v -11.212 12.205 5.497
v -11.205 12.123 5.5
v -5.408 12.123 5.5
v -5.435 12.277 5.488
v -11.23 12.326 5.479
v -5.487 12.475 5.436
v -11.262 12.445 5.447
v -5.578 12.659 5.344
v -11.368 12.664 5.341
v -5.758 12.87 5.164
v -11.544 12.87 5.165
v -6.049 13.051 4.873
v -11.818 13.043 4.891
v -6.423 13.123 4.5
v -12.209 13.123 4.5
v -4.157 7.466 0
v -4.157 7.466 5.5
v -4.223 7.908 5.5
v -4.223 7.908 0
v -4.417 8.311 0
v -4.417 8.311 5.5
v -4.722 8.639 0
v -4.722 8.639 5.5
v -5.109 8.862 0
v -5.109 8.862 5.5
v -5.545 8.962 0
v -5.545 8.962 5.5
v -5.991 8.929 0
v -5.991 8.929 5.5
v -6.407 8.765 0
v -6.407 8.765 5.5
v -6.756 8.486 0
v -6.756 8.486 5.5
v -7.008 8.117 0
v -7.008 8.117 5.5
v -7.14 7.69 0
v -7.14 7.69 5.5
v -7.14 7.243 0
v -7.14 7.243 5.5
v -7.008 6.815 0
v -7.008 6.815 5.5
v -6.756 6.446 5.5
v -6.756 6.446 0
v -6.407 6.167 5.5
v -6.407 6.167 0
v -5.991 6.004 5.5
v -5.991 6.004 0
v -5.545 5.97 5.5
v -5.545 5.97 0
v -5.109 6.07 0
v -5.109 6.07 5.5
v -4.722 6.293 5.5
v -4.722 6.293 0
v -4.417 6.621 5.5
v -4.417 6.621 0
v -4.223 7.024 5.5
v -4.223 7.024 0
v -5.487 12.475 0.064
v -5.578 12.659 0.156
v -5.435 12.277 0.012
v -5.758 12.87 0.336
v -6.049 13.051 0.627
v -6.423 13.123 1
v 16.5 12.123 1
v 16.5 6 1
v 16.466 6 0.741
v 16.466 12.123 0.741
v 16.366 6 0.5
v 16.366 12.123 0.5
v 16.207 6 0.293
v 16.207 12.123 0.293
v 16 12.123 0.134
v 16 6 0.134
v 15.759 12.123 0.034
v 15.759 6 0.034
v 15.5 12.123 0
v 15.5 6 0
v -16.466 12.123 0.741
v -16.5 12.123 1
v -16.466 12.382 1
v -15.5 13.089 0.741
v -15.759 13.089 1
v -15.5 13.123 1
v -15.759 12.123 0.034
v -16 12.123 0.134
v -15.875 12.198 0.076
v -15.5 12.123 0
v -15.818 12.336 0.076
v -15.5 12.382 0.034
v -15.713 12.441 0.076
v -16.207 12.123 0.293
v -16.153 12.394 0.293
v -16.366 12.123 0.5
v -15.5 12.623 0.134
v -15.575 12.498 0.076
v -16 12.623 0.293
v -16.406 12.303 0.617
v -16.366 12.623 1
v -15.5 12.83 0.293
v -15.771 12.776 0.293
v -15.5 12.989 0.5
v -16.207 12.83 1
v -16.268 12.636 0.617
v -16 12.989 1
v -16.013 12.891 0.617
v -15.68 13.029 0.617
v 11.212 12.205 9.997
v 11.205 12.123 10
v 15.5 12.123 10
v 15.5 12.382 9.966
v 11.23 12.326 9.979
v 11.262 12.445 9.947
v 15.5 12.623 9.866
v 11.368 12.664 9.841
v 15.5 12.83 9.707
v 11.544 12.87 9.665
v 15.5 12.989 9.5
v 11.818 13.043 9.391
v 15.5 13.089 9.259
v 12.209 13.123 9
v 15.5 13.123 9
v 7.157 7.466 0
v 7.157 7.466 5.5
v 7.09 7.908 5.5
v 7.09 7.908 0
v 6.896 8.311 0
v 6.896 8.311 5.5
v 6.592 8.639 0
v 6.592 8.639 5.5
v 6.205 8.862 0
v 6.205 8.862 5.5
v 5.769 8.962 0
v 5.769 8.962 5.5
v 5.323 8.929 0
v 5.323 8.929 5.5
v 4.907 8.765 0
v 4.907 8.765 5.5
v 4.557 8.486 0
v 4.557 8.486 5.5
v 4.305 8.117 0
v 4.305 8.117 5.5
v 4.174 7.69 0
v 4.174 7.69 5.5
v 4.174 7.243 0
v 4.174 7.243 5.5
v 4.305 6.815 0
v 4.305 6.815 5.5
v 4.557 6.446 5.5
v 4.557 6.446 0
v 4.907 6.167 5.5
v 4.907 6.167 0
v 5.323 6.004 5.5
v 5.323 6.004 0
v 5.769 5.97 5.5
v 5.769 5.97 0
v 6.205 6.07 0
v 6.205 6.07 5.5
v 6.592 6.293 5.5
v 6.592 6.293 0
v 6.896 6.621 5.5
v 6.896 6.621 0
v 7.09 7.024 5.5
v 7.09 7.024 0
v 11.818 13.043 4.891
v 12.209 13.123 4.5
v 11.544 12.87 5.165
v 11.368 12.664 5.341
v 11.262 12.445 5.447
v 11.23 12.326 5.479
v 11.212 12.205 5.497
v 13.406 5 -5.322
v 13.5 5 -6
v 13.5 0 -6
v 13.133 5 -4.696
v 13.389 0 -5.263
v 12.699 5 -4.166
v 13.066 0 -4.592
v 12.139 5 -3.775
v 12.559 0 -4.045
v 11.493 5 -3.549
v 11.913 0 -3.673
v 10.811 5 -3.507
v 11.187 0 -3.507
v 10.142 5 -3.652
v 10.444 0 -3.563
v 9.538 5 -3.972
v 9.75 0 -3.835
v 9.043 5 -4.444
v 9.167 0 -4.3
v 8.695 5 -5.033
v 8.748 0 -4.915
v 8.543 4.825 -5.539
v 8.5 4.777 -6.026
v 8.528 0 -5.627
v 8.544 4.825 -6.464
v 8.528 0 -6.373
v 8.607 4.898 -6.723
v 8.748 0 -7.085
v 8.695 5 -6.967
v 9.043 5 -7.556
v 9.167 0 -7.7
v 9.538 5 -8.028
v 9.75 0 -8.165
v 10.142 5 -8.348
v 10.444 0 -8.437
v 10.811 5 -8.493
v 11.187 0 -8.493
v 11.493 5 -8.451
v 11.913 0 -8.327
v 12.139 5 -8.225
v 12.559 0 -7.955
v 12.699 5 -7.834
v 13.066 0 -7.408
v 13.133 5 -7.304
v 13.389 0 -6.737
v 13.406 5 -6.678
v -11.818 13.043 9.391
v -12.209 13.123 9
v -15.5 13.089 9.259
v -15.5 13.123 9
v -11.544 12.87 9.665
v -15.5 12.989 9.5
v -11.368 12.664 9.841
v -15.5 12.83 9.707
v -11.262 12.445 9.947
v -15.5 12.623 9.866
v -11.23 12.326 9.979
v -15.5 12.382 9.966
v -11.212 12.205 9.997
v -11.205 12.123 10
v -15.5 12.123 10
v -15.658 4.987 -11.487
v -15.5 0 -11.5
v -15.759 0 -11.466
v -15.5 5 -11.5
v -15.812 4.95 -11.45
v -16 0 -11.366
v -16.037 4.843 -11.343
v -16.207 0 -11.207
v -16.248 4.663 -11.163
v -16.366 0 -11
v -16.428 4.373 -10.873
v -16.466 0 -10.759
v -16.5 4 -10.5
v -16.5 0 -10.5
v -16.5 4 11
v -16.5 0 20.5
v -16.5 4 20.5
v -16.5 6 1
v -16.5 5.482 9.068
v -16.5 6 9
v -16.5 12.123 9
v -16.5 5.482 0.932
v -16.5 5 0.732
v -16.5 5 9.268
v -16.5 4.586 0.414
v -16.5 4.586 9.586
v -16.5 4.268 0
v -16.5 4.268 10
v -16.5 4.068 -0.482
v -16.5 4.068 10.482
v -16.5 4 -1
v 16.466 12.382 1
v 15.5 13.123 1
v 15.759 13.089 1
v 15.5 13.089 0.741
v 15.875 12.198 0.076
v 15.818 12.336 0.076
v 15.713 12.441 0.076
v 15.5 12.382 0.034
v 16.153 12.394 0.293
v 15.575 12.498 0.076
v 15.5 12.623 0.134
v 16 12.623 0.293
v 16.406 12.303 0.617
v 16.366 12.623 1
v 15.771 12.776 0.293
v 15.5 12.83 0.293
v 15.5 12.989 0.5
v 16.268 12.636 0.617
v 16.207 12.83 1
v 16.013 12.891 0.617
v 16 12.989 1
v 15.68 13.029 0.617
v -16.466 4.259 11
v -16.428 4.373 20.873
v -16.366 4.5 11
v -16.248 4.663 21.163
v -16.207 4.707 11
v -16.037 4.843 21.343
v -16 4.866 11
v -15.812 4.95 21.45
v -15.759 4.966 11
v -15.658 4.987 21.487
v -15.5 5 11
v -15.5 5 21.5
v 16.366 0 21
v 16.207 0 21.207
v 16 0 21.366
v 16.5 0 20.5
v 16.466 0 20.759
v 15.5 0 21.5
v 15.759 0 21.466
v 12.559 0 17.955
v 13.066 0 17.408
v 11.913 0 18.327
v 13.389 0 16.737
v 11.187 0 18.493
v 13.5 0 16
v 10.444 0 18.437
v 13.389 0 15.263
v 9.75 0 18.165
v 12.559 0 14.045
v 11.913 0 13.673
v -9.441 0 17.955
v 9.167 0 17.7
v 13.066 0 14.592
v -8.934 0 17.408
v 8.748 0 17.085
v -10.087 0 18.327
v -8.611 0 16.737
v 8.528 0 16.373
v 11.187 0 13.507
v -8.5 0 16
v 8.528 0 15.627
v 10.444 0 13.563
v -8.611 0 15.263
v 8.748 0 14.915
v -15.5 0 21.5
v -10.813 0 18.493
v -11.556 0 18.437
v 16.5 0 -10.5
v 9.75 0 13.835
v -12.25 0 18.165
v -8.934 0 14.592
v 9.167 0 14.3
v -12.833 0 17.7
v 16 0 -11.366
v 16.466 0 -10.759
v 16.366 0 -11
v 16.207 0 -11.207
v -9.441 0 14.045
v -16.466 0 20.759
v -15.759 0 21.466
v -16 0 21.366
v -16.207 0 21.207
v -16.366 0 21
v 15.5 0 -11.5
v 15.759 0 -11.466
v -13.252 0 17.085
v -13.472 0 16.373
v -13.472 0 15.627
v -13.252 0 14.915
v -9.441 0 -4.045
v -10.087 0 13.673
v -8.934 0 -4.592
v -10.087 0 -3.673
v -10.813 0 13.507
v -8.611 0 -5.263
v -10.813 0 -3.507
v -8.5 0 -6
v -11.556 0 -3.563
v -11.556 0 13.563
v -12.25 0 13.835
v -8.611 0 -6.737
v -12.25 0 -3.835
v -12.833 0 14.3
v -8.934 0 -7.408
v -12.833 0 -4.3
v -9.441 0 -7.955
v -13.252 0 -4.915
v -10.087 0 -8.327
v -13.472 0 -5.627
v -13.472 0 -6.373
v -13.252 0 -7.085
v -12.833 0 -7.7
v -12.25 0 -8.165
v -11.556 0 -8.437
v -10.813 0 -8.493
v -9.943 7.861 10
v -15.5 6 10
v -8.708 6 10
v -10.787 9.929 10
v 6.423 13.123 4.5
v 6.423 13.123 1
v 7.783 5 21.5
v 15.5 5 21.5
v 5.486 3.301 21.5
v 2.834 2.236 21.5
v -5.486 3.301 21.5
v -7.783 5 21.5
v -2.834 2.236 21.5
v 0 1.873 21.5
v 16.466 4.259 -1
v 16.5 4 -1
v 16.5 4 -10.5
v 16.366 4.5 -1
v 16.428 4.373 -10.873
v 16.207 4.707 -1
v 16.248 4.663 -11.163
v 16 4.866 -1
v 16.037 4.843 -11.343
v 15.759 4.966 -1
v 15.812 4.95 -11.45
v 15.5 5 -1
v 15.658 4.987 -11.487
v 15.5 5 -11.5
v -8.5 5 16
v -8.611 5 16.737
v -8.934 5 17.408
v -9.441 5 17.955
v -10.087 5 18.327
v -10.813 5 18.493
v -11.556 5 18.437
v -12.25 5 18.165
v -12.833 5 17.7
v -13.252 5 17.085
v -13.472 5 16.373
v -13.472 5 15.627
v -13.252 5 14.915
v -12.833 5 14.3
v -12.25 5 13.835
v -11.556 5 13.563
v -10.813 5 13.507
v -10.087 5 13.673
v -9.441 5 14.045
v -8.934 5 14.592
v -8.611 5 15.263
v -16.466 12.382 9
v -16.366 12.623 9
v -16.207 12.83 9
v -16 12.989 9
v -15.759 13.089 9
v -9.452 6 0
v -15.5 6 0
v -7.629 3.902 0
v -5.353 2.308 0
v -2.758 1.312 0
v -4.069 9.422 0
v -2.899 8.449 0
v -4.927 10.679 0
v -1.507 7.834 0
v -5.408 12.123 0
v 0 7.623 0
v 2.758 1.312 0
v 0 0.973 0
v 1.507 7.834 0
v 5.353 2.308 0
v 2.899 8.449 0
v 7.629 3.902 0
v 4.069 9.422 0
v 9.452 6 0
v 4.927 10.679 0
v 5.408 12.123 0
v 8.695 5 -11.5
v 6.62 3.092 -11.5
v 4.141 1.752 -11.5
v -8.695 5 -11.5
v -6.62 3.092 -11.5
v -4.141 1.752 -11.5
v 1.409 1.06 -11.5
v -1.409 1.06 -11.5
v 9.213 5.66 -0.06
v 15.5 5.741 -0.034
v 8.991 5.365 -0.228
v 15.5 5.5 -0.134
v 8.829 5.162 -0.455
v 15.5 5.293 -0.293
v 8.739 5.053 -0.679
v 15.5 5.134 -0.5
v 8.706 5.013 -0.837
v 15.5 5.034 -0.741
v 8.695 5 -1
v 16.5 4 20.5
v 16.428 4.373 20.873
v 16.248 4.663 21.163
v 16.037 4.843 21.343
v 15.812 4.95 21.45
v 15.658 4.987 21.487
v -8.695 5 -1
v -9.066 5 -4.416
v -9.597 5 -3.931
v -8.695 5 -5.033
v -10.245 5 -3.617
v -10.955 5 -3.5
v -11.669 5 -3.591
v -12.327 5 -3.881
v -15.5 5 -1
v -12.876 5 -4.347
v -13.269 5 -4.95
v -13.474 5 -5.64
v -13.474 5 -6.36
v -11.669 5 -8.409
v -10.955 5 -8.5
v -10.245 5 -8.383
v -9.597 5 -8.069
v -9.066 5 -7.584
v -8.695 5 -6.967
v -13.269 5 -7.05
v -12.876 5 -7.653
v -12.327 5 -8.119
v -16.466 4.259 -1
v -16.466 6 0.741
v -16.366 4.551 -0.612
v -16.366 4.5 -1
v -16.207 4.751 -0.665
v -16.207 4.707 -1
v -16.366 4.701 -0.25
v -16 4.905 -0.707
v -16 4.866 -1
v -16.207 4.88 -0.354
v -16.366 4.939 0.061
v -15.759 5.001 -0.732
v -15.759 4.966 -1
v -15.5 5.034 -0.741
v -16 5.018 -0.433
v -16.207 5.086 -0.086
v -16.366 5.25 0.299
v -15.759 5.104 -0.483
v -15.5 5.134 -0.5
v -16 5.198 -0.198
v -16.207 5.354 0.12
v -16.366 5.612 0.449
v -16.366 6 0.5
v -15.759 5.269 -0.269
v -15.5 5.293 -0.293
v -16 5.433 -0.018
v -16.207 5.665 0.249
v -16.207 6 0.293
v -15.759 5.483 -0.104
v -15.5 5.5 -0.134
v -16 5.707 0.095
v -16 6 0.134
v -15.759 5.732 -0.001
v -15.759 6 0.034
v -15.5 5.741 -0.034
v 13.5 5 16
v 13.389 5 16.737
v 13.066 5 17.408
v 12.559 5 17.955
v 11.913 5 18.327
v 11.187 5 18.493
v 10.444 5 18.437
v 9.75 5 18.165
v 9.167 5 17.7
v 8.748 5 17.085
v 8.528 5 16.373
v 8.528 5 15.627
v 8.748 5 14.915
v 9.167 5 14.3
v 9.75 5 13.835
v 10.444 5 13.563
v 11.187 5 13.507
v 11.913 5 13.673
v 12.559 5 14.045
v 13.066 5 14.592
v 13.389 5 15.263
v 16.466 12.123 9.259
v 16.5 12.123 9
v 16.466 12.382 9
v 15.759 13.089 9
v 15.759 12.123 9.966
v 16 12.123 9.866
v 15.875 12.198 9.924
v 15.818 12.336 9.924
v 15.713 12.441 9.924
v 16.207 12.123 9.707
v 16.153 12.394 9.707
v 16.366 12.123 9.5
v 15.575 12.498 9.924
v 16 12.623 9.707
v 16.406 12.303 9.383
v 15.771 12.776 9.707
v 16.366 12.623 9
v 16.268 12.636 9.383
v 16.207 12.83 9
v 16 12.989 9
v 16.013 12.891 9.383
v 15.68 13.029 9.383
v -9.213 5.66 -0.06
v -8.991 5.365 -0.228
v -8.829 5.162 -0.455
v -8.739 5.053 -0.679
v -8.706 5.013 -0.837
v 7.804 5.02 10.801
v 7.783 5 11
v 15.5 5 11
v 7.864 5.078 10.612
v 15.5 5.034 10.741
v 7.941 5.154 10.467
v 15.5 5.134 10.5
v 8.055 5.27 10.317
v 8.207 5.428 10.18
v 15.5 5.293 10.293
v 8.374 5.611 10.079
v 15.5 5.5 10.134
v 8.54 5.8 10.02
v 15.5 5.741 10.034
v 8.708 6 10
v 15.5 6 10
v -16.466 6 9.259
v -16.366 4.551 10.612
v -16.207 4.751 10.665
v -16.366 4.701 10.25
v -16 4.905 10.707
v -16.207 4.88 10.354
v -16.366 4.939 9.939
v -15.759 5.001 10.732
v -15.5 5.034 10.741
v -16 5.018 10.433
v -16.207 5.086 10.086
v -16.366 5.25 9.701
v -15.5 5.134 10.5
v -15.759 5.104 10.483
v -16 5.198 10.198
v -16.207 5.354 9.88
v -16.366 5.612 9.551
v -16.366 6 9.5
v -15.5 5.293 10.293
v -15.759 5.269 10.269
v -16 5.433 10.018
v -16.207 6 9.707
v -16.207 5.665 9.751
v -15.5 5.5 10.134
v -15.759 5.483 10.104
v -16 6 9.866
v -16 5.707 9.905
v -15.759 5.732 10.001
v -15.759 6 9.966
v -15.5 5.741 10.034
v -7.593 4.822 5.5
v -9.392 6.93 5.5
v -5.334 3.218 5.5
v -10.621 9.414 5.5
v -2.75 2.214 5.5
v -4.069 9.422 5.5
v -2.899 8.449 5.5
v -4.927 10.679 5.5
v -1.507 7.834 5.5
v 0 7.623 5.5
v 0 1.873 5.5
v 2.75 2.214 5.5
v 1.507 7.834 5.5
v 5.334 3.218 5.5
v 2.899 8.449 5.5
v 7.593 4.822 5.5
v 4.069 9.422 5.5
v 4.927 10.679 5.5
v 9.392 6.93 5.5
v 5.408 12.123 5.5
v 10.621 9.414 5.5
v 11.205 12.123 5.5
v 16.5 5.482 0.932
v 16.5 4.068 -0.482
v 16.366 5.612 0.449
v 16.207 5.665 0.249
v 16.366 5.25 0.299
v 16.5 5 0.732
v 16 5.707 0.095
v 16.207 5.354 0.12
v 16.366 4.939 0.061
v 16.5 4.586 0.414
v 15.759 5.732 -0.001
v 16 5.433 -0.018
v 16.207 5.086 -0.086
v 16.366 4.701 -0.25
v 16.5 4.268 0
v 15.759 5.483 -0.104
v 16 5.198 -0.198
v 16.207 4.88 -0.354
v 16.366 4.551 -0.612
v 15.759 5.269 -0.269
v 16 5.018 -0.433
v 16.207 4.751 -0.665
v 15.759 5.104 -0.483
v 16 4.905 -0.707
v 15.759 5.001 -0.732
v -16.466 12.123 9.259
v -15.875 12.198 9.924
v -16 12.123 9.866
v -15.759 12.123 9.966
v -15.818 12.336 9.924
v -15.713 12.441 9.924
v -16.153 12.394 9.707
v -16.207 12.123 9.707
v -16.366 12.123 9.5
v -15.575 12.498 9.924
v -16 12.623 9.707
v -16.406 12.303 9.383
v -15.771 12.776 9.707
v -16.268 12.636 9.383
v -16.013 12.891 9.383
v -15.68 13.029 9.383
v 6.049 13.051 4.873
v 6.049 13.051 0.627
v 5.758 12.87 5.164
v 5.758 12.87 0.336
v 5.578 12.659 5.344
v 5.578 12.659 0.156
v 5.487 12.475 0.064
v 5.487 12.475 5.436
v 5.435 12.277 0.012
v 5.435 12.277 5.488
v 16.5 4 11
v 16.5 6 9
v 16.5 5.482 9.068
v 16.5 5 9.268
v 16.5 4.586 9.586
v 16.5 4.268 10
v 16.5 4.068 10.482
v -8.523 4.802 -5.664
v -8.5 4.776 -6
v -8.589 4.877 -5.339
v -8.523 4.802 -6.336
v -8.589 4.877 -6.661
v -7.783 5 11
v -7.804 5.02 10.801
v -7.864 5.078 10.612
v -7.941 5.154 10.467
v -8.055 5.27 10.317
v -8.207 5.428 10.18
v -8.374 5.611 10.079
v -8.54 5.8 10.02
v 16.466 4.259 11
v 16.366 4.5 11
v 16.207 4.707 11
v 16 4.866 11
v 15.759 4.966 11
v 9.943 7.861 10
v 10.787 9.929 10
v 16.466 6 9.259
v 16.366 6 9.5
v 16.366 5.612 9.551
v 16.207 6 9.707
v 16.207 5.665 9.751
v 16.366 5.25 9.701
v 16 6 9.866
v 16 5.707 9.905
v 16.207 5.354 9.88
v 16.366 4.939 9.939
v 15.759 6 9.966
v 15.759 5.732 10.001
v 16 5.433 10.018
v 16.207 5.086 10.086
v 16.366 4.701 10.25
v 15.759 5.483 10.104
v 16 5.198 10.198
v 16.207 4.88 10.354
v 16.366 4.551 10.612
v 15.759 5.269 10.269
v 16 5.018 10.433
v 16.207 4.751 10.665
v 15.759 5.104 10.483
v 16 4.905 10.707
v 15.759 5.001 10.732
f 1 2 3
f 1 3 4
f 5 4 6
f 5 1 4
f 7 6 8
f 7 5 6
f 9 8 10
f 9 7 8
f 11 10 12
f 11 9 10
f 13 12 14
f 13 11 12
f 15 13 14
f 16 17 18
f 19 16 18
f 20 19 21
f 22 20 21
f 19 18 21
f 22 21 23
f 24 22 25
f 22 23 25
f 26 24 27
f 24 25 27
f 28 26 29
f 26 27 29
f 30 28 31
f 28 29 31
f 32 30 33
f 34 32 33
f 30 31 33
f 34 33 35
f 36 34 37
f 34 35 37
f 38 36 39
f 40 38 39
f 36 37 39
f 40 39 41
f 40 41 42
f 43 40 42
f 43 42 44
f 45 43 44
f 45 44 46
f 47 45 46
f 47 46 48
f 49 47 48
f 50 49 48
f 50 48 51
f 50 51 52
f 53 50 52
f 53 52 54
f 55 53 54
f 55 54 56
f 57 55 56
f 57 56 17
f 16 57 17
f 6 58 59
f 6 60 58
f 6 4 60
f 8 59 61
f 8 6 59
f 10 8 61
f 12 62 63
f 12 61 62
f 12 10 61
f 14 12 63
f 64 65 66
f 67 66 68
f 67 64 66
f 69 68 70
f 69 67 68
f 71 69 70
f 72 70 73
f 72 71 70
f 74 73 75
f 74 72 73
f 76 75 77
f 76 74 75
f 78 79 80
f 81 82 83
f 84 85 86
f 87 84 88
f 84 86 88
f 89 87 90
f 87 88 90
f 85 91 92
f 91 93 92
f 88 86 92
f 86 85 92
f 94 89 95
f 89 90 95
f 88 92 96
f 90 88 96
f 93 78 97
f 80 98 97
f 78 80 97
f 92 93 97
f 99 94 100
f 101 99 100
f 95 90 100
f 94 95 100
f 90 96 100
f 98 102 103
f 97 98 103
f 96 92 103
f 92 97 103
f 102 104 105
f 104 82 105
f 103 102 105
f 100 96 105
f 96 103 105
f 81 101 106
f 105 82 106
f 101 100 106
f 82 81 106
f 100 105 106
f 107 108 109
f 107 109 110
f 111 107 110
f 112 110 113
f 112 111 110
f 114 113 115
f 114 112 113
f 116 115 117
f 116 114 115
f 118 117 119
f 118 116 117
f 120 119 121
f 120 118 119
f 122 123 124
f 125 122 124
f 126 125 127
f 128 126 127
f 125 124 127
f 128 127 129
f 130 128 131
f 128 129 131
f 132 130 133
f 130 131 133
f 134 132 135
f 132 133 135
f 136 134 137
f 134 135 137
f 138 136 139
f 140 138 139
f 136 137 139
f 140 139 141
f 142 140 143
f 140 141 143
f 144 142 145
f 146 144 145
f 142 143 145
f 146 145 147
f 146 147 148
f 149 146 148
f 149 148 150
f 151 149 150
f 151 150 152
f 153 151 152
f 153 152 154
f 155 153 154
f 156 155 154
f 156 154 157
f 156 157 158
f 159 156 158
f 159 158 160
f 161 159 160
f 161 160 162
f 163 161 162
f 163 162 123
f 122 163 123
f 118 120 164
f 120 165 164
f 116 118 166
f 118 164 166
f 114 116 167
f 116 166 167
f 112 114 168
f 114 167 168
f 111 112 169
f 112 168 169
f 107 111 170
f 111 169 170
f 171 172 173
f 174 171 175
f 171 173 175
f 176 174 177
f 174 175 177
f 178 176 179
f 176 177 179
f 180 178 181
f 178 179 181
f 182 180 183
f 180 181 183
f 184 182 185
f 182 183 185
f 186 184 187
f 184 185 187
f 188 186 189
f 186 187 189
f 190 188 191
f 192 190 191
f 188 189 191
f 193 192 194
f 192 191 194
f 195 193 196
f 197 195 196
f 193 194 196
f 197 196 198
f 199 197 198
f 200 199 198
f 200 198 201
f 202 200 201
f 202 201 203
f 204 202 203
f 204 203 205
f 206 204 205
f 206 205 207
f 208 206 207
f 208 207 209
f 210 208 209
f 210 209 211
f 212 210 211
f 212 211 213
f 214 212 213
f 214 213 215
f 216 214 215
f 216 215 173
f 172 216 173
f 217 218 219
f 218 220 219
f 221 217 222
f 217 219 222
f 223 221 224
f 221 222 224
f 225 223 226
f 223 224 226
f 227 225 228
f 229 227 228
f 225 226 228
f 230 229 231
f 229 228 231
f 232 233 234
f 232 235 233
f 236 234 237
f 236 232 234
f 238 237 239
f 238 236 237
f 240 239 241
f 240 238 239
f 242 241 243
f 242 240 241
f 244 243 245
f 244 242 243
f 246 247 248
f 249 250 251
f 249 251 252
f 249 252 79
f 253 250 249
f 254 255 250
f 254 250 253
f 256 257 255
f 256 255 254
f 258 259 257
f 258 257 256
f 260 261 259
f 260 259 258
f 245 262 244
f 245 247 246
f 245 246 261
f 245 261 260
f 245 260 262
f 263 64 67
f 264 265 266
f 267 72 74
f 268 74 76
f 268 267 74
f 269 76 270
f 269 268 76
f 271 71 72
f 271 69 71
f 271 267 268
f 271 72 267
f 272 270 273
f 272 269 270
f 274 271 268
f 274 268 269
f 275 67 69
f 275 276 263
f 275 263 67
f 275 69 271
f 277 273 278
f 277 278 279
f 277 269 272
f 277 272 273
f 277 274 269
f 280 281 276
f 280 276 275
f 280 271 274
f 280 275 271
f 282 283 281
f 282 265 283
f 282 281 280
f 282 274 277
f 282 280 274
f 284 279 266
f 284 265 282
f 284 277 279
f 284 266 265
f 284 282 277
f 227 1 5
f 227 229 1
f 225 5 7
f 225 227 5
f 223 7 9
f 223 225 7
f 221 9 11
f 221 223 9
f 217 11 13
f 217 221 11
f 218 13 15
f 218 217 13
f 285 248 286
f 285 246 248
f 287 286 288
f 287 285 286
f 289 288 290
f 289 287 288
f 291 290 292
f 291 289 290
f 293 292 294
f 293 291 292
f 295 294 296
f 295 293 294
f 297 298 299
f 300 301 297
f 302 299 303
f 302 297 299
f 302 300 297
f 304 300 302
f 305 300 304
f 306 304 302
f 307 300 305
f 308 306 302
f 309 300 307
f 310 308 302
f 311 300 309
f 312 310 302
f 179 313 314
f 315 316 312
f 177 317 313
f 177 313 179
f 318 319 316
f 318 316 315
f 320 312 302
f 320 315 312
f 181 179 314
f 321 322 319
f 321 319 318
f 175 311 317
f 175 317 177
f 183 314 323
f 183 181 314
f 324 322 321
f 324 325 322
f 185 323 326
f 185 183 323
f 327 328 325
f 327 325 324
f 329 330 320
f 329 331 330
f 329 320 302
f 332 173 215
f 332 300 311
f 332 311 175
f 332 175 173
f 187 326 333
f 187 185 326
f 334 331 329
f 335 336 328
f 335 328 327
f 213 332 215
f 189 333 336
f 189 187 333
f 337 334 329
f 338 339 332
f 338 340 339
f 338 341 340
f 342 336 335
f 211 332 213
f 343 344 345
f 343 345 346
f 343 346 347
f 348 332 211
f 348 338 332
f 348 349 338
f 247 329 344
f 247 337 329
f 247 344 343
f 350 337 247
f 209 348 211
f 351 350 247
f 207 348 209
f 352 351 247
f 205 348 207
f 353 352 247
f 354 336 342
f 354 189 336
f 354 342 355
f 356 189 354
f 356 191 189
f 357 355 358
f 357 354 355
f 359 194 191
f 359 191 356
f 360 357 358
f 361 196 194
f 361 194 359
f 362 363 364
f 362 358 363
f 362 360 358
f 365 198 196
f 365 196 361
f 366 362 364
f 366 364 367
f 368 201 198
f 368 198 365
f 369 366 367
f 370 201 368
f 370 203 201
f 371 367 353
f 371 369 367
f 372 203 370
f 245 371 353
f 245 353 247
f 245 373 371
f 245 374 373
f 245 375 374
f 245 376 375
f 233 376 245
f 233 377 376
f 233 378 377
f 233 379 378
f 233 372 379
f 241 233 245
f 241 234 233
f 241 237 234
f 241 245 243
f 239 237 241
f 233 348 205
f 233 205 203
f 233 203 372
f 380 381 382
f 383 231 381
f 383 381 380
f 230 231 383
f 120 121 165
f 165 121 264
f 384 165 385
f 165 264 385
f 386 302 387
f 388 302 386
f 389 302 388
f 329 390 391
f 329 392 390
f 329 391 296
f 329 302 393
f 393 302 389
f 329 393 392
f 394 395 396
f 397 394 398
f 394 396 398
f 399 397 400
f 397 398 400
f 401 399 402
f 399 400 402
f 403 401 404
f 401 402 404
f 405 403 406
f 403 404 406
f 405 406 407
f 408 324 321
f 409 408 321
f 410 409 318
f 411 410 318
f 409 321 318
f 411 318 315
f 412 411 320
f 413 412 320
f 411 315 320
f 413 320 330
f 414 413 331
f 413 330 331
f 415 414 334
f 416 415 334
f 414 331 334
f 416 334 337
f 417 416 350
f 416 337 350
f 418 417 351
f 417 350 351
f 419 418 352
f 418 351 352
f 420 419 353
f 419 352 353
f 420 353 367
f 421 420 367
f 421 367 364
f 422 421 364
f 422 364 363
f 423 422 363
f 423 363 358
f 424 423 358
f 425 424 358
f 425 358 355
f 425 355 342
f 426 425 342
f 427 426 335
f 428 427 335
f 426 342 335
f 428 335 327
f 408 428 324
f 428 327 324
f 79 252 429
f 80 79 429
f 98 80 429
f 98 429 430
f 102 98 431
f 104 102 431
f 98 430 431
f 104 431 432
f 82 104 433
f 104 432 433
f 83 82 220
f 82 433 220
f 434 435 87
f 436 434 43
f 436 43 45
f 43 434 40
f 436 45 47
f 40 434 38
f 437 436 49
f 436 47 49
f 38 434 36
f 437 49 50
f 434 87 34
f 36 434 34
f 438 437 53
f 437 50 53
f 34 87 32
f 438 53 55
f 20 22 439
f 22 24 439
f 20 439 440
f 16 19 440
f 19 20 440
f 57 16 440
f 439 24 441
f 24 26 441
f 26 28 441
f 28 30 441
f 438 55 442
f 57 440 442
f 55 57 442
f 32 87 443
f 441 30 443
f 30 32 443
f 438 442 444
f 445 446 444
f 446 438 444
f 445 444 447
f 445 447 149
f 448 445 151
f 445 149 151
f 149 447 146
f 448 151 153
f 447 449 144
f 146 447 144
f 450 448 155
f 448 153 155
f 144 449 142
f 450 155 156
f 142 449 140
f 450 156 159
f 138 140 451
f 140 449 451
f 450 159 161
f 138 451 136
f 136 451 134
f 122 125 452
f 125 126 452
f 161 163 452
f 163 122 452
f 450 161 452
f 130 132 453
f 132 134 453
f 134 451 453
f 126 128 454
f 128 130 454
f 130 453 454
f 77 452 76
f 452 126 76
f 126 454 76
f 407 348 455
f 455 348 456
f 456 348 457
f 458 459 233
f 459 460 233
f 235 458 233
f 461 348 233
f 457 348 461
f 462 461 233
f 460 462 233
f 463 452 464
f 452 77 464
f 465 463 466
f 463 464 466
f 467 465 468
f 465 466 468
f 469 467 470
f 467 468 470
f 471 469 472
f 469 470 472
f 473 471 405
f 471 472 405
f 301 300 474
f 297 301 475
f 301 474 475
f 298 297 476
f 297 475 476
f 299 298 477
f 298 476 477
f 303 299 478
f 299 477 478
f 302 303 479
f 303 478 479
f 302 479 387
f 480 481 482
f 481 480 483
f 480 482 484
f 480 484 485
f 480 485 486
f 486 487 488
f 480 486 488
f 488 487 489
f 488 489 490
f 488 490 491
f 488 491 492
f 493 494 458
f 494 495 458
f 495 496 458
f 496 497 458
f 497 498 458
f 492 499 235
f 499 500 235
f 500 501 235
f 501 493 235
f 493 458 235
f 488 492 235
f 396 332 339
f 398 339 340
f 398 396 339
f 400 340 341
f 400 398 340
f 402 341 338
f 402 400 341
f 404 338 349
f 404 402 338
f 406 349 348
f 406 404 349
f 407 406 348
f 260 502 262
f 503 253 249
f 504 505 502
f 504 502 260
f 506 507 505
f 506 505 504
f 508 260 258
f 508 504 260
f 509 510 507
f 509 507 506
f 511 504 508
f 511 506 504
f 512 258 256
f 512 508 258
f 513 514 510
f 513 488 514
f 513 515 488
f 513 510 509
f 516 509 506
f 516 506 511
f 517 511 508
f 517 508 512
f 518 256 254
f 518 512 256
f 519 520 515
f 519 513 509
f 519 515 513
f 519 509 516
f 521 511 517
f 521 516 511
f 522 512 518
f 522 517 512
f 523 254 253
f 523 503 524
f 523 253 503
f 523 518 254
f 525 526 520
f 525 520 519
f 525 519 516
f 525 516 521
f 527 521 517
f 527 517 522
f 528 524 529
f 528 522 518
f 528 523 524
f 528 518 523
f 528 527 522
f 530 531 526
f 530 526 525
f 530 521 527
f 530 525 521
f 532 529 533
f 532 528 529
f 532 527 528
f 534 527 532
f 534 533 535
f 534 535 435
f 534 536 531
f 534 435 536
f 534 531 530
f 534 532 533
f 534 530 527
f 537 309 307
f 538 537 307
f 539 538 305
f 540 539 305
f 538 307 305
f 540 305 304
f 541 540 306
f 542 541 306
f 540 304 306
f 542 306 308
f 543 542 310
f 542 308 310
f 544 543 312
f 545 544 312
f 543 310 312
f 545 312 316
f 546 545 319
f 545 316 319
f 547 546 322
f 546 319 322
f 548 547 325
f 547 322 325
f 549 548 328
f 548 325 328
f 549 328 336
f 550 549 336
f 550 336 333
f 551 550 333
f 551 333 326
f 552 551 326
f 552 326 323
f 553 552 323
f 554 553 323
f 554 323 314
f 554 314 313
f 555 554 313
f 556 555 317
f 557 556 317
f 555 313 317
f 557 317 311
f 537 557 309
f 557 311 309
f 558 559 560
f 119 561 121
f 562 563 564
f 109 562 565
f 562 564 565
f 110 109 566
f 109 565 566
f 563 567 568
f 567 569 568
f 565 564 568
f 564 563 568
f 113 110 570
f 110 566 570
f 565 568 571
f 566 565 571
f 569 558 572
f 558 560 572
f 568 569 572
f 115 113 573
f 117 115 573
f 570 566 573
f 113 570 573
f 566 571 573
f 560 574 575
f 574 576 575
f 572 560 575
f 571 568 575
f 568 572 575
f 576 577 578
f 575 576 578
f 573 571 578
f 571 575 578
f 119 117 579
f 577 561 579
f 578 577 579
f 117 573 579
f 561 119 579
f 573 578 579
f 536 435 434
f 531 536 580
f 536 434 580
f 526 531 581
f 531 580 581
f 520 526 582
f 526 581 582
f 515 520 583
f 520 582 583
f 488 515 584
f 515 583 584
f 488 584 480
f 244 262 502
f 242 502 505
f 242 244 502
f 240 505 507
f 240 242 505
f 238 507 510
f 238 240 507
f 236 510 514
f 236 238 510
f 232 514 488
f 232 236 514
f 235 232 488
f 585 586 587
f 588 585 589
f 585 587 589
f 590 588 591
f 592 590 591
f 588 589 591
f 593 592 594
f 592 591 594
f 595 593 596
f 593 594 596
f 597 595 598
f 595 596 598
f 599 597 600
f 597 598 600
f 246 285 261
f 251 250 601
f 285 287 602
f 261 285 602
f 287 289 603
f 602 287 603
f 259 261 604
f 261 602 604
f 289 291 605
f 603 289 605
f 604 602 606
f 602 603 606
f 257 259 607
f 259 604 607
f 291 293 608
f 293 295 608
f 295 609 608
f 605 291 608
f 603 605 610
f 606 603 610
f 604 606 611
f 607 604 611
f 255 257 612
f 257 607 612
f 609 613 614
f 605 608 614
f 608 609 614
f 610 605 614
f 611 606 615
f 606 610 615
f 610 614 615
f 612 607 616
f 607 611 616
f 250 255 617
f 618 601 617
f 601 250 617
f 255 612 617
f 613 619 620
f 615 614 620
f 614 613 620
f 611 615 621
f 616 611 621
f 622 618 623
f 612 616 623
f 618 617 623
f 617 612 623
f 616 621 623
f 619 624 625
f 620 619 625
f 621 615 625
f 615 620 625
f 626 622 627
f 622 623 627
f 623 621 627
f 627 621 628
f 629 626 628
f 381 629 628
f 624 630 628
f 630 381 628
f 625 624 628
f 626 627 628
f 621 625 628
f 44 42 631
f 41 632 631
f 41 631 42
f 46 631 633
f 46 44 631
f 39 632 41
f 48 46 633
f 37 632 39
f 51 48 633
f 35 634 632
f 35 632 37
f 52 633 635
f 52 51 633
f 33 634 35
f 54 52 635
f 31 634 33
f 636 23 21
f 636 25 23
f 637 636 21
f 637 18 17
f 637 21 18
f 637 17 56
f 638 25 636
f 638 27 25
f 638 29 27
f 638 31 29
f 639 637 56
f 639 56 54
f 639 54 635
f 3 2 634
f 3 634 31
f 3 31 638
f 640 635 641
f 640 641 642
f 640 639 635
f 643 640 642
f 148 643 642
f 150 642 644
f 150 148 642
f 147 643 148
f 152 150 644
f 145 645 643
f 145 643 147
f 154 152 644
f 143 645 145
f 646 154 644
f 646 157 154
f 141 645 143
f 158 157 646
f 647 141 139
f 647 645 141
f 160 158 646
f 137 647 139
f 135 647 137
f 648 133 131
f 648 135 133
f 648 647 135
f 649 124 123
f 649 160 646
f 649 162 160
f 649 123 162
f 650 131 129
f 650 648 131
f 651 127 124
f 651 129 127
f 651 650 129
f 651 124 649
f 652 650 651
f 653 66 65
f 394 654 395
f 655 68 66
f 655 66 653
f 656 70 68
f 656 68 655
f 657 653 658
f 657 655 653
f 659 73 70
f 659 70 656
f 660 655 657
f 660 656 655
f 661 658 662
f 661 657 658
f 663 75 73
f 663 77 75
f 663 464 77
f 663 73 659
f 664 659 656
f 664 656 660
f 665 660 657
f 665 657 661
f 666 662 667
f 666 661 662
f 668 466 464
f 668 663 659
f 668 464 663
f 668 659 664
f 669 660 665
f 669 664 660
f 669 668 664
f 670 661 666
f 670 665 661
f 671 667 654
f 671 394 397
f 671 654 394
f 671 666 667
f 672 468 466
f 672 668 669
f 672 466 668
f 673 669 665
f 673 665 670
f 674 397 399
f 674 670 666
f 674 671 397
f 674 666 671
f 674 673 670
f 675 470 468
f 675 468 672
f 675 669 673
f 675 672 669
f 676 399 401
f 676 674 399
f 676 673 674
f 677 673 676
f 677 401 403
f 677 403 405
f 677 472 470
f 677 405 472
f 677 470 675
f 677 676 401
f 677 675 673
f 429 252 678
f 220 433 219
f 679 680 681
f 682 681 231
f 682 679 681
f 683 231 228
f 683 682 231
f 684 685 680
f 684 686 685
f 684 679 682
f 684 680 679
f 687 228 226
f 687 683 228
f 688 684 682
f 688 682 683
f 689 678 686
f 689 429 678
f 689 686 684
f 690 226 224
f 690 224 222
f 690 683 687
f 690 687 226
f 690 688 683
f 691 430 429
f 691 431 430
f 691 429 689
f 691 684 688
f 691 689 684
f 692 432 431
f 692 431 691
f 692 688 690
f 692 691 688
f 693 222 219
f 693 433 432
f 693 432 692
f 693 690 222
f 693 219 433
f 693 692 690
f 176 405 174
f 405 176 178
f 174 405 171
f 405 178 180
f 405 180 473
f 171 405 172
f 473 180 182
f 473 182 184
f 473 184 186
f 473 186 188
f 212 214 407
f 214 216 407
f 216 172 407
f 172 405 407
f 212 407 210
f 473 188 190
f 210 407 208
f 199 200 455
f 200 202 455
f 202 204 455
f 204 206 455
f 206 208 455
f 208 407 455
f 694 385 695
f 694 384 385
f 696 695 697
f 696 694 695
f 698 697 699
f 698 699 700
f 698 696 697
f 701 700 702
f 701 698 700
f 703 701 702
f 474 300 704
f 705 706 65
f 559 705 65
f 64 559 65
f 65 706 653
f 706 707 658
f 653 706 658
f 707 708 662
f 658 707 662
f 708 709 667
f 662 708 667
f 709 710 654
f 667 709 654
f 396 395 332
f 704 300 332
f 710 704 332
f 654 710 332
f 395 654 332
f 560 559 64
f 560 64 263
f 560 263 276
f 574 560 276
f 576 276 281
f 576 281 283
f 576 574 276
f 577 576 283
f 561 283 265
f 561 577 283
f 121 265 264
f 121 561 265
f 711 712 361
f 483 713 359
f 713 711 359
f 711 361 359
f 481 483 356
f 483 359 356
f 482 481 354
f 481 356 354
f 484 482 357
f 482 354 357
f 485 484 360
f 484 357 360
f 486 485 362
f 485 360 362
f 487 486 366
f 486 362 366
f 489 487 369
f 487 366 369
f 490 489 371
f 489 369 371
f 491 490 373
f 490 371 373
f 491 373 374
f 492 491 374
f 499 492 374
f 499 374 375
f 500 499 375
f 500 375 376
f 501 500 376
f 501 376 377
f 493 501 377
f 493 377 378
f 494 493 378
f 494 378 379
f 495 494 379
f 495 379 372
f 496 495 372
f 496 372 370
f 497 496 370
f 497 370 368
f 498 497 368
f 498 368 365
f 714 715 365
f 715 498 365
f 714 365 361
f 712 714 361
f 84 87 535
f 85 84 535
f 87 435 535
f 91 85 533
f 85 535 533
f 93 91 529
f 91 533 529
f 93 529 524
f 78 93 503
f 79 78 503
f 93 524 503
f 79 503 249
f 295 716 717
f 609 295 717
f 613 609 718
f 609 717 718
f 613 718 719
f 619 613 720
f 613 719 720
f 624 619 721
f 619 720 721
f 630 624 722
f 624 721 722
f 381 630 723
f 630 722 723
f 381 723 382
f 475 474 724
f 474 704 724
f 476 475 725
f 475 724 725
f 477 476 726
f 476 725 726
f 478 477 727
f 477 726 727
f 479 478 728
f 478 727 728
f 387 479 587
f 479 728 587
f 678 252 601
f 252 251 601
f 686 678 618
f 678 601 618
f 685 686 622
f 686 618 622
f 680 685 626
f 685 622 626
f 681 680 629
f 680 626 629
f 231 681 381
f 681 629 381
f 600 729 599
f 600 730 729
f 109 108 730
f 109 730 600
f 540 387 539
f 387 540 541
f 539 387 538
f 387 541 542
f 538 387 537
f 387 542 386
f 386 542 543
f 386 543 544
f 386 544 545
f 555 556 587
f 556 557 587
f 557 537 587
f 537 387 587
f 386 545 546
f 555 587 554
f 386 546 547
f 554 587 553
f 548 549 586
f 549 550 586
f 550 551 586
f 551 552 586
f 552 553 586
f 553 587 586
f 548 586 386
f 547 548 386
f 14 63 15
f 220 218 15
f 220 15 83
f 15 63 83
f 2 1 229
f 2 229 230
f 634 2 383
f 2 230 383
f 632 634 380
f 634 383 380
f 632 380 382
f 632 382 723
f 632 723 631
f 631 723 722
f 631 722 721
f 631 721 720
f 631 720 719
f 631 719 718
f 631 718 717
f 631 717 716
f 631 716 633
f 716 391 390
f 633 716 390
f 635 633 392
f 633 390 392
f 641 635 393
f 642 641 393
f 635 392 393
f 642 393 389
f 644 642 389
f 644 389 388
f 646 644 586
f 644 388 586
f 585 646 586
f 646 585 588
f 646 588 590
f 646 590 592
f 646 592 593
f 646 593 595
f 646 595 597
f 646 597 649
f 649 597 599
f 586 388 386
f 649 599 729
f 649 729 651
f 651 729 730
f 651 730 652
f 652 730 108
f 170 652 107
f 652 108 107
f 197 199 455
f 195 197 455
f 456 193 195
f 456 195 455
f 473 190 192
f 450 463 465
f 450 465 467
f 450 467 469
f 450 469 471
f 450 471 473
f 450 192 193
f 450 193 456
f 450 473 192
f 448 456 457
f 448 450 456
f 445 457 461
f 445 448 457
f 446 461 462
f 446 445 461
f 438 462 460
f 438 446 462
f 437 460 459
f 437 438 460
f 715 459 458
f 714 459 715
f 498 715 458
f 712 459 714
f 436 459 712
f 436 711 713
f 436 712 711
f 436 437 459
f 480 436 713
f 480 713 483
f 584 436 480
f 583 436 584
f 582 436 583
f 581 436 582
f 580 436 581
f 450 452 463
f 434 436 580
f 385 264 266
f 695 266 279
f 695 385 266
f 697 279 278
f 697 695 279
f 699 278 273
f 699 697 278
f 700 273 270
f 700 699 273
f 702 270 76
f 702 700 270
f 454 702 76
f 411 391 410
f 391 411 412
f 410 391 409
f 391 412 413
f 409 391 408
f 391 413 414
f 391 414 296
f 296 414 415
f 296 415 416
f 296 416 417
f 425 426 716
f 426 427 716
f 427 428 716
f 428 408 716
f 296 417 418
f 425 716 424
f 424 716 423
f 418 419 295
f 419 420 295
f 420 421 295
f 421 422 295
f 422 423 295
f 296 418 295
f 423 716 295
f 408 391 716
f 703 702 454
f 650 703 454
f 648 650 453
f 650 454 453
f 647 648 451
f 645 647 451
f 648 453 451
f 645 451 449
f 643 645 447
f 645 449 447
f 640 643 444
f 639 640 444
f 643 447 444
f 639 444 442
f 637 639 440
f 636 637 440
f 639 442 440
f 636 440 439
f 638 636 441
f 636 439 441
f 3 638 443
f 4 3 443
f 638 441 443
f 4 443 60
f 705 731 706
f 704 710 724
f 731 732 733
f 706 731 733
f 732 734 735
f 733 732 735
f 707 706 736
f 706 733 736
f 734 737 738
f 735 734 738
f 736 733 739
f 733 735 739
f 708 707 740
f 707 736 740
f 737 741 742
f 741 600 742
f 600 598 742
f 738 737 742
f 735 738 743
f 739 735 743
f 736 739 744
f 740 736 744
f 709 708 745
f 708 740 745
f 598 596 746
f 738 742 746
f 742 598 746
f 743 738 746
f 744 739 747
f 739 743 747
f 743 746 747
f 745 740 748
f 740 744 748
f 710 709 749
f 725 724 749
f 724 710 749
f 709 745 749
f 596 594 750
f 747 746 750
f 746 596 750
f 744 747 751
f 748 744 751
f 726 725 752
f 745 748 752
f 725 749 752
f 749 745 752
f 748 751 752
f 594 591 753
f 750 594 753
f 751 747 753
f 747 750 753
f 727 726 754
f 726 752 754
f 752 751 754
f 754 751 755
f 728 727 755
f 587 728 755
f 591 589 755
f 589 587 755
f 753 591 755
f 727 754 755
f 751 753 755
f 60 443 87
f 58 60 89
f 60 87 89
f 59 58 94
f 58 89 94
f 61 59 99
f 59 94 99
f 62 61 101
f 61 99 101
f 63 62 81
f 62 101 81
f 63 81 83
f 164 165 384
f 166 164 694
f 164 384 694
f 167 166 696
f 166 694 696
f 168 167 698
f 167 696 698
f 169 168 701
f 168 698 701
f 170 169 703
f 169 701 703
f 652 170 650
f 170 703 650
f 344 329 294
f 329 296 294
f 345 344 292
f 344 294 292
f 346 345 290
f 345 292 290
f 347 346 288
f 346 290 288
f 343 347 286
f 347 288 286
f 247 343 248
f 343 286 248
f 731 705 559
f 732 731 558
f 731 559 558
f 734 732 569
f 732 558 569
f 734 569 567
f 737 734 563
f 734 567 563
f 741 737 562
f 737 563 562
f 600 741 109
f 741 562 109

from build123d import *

# Parameters (mm, degrees)
BOSS_EXTRUDE1_DEPTH = 10
SKETCH6_W           = 33
SKETCH6_H           = 33
SKETCH6_R           = 2.5
BOSS_EXTRUDE2_DEPTH = 5
SKETCH4_R           = 11.25
CUT_EXTRUDE1_DEPTH  = 16
CUT_EXTRUDE2_REACH  = 29.083
SKETCH5_R           = 1.5
CUT_EXTRUDE3_REACH  = 32.112
SKETCH7_R           = 11.399645817
FILLET1_R           = 1


with BuildPart() as part:
    # Sketch3 → Boss-Extrude1 (new body)
    with BuildSketch(Plane.XY):
        with BuildLine():
            Line((-16.5, 0), (16.5, 0))
            Line((16.5, 0), (16.5, 13.123))
            Line((16.5, 13.123), (11.5, 13.123))
            Line((11.5, 13.123), (5.5, 13.123))
            ThreePointArc((5.5, 13.123), (0, 7.623), (-5.5, 13.123))
            Line((-5.5, 13.123), (-11.5, 13.123))
            Line((-11.5, 13.123), (-16.5, 13.123))
            Line((-16.5, 13.123), (-16.5, 0))
        make_face()
    extrude(amount=BOSS_EXTRUDE1_DEPTH)

    # Sketch6 → Boss-Extrude2 (add)
    with BuildSketch(Plane(origin=(0, 0, 0), x_dir=(-1, 0, 0), z_dir=(0, -1, 0))):
        with Locations((0, -5)):
            Rectangle(SKETCH6_W, SKETCH6_H)
        with Locations(Location((11, -16, 0), (0, 0, 180))):
            Circle(SKETCH6_R, mode=Mode.SUBTRACT)
        with Locations(Location((-11, -16, 0), (0, 0, 180))):
            Circle(SKETCH6_R, mode=Mode.SUBTRACT)
        with Locations(Location((-11, 6, 0), (0, 0, 180))):
            Circle(SKETCH6_R, mode=Mode.SUBTRACT)
        with Locations(Location((11, 6, 0), (0, 0, 180))):
            Circle(SKETCH6_R, mode=Mode.SUBTRACT)
    extrude(amount=-BOSS_EXTRUDE2_DEPTH)

    # Sketch4 → Cut-Extrude1 (cut)
    with BuildSketch(Plane.XY.offset(21.5)):
        with Locations((0, 13.123)):
            Circle(SKETCH4_R)
    extrude(amount=-CUT_EXTRUDE1_DEPTH, mode=Mode.SUBTRACT)

    # Sketch5 → Cut-Extrude2 (cut, up to next)
    with BuildSketch(Plane.XY.offset(5.5), mode=Mode.PRIVATE) as cut_extrude2_sk1:
        with Locations((-5.656854249, 7.466145751)):
            Circle(SKETCH5_R)
    cut_extrude2_tool1 = extrude(cut_extrude2_sk1.sketch, amount=-CUT_EXTRUDE2_REACH, mode=Mode.PRIVATE) & part.part
    # Sketch5 → Cut-Extrude2 (cut, up to next)
    with BuildSketch(Plane.XY.offset(5.5), mode=Mode.PRIVATE) as cut_extrude2_sk2:
        with Locations((5.656854249, 7.466145751)):
            Circle(SKETCH5_R)
    cut_extrude2_tool2 = extrude(cut_extrude2_sk2.sketch, amount=-CUT_EXTRUDE2_REACH, mode=Mode.PRIVATE) & part.part
    add(cut_extrude2_tool1.solids().sort_by_distance((-5.656854, 7.466146, 5.5))[0], mode=Mode.SUBTRACT)
    add(cut_extrude2_tool2.solids().sort_by_distance((5.656854, 7.466146, 5.5))[0], mode=Mode.SUBTRACT)

    # Sketch7 → Cut-Extrude3 (cut, up to next)
    with BuildSketch(Plane(origin=(0, 0, 0), x_dir=(-1, 0, 0), z_dir=(0, 0, -1)), mode=Mode.PRIVATE) as cut_extrude3_sk1:
        with Locations((0, 12.372645817)):
            Circle(SKETCH7_R)
    cut_extrude3_tool1 = extrude(cut_extrude3_sk1.sketch, amount=CUT_EXTRUDE3_REACH, mode=Mode.PRIVATE) & part.part
    add(cut_extrude3_tool1.solids().sort_by_distance((0, 12.372646, 0))[0], mode=Mode.SUBTRACT)

    # Fillet1
    fillet1_edges = [part.edges().sort_by_distance(p)[0] for p in [
        (16.5, 13.123, 5),
        (-16.5, 13.123, 5),
        (16.5, 9.0615, 0),
        (-16.5, 9.0615, 0),
        (-12.597298541, 5, 0),
        (-16.5, 9.0615, 10),
        (16.5, 9.0615, 10),
        (-16.5, 5, -5.75),
        (-16.5, 2.5, -11.5),
        (16.5, 5, -5.75),
        (-12.141637541, 5, 10),
        (13.875, 13.123, 10),
        (-16.5, 5, 15.75),
        (-16.5, 2.5, 21.5),
        (16.5, 5, 15.75),
        (16.5, 2.5, 21.5),
        (16.5, 2.5, -11.5),
        (12.141637541, 5, 10),
        (5.5, 13.123, 2.75),
        (8.375, 13.123, 5.5),
        (-5.5, 13.123, 2.75),
        (11.25, 13.123, 7.75),
        (-11.25, 13.123, 7.75),
        (-8.375, 13.123, 5.5),
        (11, 13.123, 0),
        (12.597298541, 5, 0),
        (-13.875, 13.123, 10),
        (-11, 13.123, 0),
    ]]
    fillet(fillet1_edges, radius=FILLET1_R)


solid = part.part
